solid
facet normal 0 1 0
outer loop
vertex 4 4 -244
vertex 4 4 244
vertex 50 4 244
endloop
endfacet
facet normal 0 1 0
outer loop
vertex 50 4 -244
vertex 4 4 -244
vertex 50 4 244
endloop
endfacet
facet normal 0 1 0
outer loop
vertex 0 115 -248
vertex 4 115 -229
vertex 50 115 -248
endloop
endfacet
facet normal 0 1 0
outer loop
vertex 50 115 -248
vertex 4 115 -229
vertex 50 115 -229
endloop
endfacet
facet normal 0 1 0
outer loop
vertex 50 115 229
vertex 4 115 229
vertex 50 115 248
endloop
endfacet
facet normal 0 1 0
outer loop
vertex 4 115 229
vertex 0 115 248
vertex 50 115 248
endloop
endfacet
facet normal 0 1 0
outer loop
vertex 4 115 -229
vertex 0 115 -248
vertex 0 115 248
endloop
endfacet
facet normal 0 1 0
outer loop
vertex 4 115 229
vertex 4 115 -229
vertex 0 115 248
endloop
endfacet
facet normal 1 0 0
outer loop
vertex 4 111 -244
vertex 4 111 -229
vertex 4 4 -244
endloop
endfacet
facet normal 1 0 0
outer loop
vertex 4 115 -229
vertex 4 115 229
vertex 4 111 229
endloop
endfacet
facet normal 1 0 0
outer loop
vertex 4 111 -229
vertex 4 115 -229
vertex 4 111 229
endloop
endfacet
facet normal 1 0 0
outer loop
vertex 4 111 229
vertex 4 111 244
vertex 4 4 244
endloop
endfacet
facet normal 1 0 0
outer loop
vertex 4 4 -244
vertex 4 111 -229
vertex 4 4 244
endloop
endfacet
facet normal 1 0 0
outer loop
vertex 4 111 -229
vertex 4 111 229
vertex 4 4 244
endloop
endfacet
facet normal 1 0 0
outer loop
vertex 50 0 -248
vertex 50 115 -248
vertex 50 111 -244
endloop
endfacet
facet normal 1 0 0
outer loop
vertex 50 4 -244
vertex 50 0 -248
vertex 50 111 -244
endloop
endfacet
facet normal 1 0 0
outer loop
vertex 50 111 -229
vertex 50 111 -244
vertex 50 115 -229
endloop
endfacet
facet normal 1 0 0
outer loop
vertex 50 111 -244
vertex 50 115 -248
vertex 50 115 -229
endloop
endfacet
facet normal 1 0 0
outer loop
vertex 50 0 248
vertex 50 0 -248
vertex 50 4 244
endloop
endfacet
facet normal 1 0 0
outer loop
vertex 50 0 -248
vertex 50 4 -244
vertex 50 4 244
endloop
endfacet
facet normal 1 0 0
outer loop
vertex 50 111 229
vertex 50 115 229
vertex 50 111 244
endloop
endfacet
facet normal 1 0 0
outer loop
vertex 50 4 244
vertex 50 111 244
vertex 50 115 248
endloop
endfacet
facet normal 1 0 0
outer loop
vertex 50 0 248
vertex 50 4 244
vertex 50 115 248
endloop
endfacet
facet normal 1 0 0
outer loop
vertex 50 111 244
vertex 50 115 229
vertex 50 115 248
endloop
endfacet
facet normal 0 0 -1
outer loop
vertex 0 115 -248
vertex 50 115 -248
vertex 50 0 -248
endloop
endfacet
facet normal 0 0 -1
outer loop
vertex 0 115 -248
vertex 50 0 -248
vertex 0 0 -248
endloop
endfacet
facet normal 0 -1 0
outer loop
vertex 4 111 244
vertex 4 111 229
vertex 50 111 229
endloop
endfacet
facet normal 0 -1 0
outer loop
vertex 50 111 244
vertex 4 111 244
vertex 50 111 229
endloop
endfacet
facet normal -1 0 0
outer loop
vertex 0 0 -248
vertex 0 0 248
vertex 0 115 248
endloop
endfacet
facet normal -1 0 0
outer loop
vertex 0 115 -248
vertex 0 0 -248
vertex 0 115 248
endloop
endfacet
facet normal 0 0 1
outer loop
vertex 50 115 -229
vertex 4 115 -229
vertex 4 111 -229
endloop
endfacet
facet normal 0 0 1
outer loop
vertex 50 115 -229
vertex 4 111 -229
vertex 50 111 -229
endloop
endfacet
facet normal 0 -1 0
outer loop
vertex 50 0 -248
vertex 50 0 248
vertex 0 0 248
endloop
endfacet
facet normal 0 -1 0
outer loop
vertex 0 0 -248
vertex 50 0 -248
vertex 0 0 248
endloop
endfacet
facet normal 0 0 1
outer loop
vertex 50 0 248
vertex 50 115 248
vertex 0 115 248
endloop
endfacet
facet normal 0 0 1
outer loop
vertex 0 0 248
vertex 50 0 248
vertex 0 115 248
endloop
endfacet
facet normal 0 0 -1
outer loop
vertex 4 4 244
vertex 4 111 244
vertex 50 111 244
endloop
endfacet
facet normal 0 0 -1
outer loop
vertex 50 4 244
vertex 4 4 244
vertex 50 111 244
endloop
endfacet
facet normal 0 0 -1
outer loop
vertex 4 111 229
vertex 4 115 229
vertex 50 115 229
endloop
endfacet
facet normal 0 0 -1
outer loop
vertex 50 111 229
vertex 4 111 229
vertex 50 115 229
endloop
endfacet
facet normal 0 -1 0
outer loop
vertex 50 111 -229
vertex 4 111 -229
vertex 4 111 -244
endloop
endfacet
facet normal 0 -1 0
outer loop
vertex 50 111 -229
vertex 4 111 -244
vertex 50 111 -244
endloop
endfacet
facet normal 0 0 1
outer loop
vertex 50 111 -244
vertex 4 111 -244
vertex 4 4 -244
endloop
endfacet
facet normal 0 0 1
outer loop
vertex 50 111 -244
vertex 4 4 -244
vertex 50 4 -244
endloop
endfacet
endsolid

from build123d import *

# Parameters (mm, degrees)
SALIENTE_EXTRUIR1_DEPTH      = 248
SALIENTE_EXTRUIR1_DEPTH_BACK = 248
CROQUIS2_W                   = 50
CROQUIS2_H                   = 115
SALIENTE_EXTRUIR2_DEPTH      = 4
CROQUIS5_W                   = 46
CROQUIS5_H                   = 15
SALIENTE_EXTRUIR5_DEPTH      = 4


with BuildPart() as part:
    # Croquis1 → Saliente-Extruir1 (new, two sides: drawn at the far end of the back side and taken through both)
    with BuildSketch(Plane.XY.offset(-SALIENTE_EXTRUIR1_DEPTH_BACK)):
        Polygon((0, 0), (0, 115), (4, 115), (4, 4), (50, 4), (50, 0), align=None)
    extrude(amount=SALIENTE_EXTRUIR1_DEPTH + SALIENTE_EXTRUIR1_DEPTH_BACK)

    # Croquis2 → Saliente-Extruir2 (add)
    with BuildSketch(Plane.XY.offset(248)):
        with Locations((25, 57.5)):
            Rectangle(CROQUIS2_W, CROQUIS2_H)
    saliente_extruir2 = extrude(amount=-SALIENTE_EXTRUIR2_DEPTH)

    # Simetría1: Saliente-Extruir2 across plane
    add(saliente_extruir2.mirror(Plane.XY))

    # Croquis5 → Saliente-Extruir5 (add)
    with BuildSketch(Plane(origin=(0, 115, 0), x_dir=(1, 0, 0), z_dir=(0, 1, 0))):
        with Locations((27, -236.5)):
            Rectangle(CROQUIS5_W, CROQUIS5_H)
    saliente_extruir5 = extrude(amount=-SALIENTE_EXTRUIR5_DEPTH)

    # Simetría2: Saliente-Extruir5 across plane
    add(saliente_extruir5.mirror(Plane.XY))


solid = part.part
